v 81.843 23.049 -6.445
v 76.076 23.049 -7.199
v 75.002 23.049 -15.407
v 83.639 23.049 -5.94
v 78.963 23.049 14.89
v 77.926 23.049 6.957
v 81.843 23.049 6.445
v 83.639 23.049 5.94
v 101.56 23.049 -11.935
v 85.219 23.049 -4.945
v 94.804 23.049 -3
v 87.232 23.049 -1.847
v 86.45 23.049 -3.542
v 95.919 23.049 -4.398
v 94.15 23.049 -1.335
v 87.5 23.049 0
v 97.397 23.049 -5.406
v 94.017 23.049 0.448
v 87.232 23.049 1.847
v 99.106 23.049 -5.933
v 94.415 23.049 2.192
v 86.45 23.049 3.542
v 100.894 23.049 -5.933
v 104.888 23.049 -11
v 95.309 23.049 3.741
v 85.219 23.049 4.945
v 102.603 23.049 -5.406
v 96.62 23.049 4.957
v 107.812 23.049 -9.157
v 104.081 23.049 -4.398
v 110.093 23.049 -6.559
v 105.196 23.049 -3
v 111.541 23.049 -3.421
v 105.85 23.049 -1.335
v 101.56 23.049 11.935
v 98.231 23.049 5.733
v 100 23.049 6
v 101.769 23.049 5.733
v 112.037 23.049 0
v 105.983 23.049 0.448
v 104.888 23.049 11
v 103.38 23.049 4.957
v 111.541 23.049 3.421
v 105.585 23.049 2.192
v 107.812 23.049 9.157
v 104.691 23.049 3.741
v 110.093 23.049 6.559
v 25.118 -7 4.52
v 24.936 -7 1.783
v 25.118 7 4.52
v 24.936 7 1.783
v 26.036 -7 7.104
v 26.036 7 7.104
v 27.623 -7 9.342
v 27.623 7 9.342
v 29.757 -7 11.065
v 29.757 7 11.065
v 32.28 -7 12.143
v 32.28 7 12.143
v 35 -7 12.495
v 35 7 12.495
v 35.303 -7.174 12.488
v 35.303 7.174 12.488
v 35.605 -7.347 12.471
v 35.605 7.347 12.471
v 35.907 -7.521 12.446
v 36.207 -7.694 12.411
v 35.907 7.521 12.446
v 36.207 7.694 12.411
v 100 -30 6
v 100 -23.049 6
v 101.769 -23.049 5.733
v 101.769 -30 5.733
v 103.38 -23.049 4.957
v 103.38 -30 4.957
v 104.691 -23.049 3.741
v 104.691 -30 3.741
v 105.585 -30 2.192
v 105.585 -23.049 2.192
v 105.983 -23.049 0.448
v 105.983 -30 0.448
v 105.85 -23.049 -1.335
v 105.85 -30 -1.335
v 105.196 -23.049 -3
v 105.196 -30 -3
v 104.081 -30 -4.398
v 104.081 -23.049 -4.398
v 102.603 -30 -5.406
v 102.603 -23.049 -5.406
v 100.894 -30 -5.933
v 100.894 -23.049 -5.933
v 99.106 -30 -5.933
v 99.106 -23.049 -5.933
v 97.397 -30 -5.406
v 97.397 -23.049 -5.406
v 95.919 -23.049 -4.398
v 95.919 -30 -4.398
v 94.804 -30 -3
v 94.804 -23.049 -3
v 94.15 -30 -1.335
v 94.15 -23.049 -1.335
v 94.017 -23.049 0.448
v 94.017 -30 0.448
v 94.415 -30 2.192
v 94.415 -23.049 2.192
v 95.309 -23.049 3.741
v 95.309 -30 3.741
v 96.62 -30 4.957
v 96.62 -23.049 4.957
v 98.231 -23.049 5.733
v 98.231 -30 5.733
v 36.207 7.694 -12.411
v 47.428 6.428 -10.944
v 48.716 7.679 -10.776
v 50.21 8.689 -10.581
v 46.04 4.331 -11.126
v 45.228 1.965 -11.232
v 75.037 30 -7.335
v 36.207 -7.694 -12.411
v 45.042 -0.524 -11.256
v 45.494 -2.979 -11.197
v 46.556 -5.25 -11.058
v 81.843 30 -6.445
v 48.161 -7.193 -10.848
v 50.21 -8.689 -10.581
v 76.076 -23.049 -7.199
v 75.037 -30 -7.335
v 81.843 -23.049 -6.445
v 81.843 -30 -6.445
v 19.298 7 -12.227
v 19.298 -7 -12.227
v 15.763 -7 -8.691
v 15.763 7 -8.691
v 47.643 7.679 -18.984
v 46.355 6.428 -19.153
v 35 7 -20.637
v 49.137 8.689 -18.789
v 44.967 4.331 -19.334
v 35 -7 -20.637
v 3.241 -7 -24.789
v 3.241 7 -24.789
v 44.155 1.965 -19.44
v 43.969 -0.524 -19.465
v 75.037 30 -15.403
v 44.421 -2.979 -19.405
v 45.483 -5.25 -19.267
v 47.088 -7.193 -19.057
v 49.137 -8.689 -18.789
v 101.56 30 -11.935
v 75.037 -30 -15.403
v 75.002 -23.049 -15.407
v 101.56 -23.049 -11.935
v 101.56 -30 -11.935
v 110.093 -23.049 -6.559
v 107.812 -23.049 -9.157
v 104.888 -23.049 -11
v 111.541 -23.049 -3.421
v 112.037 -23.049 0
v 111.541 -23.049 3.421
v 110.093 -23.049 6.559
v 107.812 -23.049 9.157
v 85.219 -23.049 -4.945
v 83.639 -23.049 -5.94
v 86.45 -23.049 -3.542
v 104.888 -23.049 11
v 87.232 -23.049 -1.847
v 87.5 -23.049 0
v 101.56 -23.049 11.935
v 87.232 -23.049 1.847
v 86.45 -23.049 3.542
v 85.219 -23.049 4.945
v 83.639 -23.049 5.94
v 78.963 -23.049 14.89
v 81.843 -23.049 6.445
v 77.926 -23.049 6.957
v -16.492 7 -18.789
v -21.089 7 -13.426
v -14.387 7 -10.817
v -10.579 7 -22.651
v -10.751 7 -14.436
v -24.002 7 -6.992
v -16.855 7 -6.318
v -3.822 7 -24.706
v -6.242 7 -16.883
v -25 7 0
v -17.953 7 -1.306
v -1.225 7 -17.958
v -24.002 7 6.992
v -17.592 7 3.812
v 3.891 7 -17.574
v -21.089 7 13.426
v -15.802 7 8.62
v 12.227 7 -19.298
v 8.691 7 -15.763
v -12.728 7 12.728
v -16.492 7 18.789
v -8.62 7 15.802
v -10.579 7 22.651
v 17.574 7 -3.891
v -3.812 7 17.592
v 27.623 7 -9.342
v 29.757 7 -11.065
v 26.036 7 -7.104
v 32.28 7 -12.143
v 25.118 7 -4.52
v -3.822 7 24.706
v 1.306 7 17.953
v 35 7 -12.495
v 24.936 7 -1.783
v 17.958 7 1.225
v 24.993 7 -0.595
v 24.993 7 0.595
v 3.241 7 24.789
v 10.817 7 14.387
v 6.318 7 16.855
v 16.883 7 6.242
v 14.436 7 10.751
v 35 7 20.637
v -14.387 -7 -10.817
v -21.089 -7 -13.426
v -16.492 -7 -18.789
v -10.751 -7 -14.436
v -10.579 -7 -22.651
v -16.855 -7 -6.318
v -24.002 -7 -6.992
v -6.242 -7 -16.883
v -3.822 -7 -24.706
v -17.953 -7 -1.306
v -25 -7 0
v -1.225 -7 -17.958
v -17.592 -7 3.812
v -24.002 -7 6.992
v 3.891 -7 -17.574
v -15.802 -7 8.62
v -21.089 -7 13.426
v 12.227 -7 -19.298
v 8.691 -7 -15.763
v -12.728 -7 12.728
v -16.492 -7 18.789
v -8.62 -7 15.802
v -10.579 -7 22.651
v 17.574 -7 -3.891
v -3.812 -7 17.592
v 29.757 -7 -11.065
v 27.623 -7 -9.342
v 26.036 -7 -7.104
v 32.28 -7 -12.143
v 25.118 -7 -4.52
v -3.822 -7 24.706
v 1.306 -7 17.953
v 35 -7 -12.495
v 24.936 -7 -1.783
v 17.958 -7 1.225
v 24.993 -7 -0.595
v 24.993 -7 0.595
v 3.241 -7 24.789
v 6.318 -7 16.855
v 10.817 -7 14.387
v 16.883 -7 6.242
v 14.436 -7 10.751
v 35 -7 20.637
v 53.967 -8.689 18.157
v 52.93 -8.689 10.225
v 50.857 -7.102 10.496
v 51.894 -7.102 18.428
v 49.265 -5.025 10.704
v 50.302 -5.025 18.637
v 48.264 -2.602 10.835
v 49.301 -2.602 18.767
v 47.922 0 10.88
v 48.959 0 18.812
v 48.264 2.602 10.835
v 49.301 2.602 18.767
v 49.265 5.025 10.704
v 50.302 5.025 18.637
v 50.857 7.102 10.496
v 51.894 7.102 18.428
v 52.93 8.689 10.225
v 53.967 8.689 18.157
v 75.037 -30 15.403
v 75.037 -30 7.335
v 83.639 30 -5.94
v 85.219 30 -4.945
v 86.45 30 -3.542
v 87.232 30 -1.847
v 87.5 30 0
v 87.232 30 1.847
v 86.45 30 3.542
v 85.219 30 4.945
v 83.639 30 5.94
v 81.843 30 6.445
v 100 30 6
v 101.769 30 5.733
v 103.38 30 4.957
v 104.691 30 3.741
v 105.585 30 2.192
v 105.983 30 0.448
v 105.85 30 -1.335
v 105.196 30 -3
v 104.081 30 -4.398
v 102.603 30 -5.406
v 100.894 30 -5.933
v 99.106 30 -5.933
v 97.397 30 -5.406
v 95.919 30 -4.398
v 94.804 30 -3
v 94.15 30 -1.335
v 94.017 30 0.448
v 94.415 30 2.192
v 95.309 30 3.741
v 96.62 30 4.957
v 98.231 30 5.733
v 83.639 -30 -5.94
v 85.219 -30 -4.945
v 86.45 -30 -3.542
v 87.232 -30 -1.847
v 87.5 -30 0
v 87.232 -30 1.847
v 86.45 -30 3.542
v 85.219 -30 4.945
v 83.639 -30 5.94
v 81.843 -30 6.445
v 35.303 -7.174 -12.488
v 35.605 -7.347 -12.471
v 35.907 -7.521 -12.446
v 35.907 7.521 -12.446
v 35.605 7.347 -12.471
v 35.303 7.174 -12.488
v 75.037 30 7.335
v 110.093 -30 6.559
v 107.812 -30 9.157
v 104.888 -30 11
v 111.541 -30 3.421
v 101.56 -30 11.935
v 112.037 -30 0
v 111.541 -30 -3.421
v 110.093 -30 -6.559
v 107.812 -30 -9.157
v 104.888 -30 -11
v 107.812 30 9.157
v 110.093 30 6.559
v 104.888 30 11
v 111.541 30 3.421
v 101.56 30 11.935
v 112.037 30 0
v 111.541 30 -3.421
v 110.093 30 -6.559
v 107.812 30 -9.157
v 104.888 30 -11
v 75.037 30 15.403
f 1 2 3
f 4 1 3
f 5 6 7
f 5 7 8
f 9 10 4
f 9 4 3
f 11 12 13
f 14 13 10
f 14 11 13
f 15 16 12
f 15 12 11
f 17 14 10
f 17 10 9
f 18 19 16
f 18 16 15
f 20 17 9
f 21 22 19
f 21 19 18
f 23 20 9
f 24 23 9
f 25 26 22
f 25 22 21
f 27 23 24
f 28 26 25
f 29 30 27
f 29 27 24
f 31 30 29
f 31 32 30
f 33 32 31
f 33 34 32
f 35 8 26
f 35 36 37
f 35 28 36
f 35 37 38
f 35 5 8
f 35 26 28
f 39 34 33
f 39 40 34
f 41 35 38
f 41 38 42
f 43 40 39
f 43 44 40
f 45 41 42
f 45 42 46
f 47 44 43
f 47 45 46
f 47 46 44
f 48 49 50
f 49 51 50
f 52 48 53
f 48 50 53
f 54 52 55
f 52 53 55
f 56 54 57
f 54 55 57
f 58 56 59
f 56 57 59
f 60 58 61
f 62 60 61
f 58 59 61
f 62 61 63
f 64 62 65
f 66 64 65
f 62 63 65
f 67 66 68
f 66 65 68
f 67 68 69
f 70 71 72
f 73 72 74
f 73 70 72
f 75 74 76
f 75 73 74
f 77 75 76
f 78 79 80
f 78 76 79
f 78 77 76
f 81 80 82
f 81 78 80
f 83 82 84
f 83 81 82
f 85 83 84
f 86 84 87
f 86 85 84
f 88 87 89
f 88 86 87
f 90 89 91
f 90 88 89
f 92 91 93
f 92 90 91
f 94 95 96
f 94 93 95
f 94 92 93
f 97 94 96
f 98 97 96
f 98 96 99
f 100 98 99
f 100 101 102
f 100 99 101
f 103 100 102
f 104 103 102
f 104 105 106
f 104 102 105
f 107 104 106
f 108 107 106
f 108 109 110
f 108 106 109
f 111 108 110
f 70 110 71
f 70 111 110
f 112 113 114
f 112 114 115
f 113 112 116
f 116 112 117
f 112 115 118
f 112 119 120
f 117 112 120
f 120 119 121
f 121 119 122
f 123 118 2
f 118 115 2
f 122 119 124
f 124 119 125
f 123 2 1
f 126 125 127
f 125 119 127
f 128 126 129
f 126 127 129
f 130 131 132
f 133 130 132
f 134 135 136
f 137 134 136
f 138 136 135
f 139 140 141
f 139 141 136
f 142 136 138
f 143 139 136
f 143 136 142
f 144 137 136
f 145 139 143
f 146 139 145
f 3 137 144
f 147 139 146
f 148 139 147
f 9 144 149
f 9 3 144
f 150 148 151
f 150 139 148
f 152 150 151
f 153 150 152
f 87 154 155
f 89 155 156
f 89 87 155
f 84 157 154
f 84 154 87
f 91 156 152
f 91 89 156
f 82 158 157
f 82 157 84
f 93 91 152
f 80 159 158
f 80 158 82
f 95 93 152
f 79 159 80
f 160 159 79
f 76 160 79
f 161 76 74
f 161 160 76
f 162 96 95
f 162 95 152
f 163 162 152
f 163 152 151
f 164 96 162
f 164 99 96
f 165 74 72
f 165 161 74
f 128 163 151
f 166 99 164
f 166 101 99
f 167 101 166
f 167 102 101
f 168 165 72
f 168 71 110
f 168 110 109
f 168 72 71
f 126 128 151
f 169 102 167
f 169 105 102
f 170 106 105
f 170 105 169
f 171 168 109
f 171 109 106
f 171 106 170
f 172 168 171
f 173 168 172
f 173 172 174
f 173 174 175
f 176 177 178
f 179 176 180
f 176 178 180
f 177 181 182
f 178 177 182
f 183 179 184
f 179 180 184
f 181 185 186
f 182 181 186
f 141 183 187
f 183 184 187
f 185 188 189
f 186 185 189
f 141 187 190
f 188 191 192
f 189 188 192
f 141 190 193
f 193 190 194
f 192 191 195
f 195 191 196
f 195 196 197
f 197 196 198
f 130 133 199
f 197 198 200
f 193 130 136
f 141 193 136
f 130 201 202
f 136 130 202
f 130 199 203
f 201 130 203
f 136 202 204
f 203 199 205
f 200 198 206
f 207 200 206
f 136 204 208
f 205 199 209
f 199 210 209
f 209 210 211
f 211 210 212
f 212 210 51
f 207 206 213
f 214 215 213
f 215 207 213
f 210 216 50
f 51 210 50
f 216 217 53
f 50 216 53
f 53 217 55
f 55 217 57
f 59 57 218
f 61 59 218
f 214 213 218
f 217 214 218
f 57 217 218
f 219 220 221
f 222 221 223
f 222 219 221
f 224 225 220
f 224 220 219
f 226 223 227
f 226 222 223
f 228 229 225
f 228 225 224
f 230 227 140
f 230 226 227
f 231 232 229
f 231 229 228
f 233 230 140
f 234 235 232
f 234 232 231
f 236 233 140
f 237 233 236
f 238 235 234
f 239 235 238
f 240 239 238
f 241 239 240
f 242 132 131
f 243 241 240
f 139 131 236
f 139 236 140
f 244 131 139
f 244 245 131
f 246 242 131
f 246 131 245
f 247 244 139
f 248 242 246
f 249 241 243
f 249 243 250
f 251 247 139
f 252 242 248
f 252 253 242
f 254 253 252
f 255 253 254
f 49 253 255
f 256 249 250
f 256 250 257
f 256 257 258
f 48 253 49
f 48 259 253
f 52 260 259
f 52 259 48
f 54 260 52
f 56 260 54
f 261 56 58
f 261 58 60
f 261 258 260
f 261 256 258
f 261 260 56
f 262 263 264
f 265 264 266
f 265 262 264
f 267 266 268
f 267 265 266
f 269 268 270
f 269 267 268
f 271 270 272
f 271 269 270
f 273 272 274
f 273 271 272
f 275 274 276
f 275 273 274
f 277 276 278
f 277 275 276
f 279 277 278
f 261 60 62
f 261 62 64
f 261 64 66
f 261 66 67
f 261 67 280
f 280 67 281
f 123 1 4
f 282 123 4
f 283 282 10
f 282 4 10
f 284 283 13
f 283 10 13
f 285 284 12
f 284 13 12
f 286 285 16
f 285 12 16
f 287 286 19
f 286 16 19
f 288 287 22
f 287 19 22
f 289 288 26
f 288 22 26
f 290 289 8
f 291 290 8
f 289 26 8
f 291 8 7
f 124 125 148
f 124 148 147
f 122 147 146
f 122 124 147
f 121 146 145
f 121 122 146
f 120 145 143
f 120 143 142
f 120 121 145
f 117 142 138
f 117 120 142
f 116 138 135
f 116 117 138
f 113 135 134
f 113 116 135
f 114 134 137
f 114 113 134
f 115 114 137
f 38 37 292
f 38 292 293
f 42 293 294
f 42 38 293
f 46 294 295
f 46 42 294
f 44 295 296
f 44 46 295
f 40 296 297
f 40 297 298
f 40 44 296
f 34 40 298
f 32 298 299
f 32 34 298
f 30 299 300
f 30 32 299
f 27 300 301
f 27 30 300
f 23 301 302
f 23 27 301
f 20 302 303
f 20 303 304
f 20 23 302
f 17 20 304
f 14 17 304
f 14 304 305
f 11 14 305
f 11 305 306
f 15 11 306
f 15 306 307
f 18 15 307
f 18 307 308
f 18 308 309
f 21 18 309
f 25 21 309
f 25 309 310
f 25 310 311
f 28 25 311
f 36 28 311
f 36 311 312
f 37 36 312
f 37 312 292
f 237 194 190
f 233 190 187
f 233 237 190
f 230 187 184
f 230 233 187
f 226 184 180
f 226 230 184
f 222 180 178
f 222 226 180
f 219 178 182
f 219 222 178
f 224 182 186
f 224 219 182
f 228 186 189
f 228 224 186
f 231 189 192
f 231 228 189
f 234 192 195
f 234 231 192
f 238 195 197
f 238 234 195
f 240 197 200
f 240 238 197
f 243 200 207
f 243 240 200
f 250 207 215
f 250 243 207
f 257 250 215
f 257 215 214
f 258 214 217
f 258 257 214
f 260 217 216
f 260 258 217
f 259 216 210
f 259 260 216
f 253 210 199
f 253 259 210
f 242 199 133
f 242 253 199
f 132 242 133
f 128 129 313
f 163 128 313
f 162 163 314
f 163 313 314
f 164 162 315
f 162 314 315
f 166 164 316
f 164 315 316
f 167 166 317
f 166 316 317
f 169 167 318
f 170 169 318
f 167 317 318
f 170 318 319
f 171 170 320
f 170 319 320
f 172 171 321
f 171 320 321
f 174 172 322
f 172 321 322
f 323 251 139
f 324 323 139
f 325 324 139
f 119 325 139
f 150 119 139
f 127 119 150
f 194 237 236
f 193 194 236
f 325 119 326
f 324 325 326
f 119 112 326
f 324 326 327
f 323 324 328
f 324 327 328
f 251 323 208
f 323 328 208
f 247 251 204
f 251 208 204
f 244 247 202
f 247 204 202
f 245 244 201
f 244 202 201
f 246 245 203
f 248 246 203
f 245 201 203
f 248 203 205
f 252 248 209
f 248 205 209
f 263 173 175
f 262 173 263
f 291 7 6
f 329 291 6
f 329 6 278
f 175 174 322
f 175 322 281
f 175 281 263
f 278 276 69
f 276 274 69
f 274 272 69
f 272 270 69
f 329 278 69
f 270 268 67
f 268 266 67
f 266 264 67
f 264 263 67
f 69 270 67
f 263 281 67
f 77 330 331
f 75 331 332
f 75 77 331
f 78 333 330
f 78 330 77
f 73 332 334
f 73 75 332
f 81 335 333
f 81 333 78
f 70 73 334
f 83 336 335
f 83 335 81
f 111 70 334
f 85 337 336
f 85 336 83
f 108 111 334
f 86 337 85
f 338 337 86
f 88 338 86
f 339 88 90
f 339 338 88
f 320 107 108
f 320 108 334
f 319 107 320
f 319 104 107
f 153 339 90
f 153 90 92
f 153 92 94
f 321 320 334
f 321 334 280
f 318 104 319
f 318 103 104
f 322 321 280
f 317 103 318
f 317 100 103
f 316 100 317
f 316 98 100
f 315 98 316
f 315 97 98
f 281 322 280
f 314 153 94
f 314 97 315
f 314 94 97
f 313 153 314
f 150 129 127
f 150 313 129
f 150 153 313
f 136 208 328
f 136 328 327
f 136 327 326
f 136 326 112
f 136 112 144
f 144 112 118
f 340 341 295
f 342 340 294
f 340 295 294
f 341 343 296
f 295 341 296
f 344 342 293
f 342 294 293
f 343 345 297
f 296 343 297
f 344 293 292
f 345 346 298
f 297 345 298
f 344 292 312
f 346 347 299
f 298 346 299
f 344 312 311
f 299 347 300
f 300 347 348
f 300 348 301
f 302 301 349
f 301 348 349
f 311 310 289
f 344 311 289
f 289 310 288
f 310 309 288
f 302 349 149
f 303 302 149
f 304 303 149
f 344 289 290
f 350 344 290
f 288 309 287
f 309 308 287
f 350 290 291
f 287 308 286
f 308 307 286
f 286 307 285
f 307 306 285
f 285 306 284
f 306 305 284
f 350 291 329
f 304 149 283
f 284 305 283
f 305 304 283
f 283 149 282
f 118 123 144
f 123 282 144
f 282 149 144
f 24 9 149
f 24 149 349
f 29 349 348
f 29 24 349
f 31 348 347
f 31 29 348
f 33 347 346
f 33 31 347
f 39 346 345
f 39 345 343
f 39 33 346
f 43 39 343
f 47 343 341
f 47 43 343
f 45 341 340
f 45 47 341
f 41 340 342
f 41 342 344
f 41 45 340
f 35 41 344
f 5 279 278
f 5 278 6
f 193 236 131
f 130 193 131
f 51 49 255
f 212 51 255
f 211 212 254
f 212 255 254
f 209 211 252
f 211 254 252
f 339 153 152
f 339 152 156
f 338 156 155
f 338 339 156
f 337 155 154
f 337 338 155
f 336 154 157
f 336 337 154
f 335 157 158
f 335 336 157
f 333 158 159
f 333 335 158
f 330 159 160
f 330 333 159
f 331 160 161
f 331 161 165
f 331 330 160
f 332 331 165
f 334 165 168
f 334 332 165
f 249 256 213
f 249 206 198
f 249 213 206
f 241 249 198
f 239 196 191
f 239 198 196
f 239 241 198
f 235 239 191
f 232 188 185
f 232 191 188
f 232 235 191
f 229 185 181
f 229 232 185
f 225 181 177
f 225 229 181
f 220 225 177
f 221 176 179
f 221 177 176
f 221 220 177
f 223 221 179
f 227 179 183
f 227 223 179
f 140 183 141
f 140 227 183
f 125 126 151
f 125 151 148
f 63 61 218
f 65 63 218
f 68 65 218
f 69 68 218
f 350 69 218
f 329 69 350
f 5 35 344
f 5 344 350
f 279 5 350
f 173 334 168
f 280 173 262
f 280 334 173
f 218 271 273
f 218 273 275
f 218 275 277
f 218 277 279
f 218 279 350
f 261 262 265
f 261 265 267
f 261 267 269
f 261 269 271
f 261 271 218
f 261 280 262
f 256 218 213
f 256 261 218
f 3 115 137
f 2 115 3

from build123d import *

# Parameters (mm, degrees)
BOSS_EXTRUDE2_DEPTH            = 30
BOSS_EXTRUDE2_DEPTH_BACK       = 30
SKETCH1_R                      = 6
SKETCH1_R_2                    = 18
CUT_EXTRUDE1_DEPTH             = 30
CUT_EXTRUDE1_DIRECTION_2_REACH = 120.648
CUT_EXTRUDE3_DEPTH             = 124.351468544
FILLET1_R                      = 10
CUT_EXTRUDE4_DEPTH             = 121.608033182


with BuildPart() as part:
    # Sketch1 → Boss-Extrude2 (new, two sides: drawn at the far end of the back side and taken through both)
    with BuildSketch(Plane(origin=(0, 0, 0), x_dir=(1, 0, 0), z_dir=(0, 1, 0)).offset(-BOSS_EXTRUDE2_DEPTH_BACK)):
        with BuildLine():
            Line((3.240740741, 24.789062093), (101.560356653, 11.935474341))
            ThreePointArc((101.560356653, 11.935474341), (112.037037037, 0), (101.560356653, -11.935474341))
            Line((101.560356653, -11.935474341), (3.240740741, -24.789062093))
            ThreePointArc((3.240740741, -24.789062093), (-25, 0), (3.240740741, 24.789062093))
        make_face()
        with Locations((100, 0)):
            Circle(SKETCH1_R, mode=Mode.SUBTRACT)
        Circle(SKETCH1_R_2, mode=Mode.SUBTRACT)
        with BuildLine():
            Line((20.379344255, 14.480411863), (81.842592593, 6.445156144))
            ThreePointArc((81.842592593, 6.445156144), (87.5, 0), (81.842592593, -6.445156144))
            Line((81.842592593, -6.445156144), (20.379344255, -14.480411863))
            ThreePointArc((20.379344255, -14.480411863), (25, 0), (20.379344255, 14.480411863))
        make_face(mode=Mode.SUBTRACT)
    extrude(amount=BOSS_EXTRUDE2_DEPTH + BOSS_EXTRUDE2_DEPTH_BACK)

    # Sketch3 → Cut-Extrude1 (cut)
    with BuildSketch(Plane.XY):
        Polygon((-25, 7), (35, 7), (75.037037037, 30), (-25, 30), align=None)
    cut_extrude1 = extrude(amount=-CUT_EXTRUDE1_DEPTH, mode=Mode.SUBTRACT)

    # Sketch3 → Cut-Extrude1 direction 2 (cut, up to next)
    with BuildSketch(Plane.XY, mode=Mode.PRIVATE) as cut_extrude1_direction_2_sk1:
        Polygon((-25, 7), (35, 7), (75.037037037, 30), (-25, 30), align=None)
    cut_extrude1_direction_2_tool1 = extrude(cut_extrude1_direction_2_sk1.sketch, amount=CUT_EXTRUDE1_DIRECTION_2_REACH, mode=Mode.PRIVATE) & part.part
    cut_extrude1_direction_2 = cut_extrude1_direction_2_tool1.solids().sort_by_distance((15.843943, 19.458999, 0))[0]
    add(cut_extrude1_direction_2, mode=Mode.SUBTRACT)

    # Mirror1: Cut-Extrude1, Cut-Extrude1 direction 2 across plane
    add(cut_extrude1.mirror(Plane.ZX), mode=Mode.SUBTRACT)
    add(cut_extrude1_direction_2.mirror(Plane.ZX), mode=Mode.SUBTRACT)

    # Sketch4 → Cut-Extrude3 (cut, through all)
    with BuildSketch(Plane(origin=(3.240740741, 0, 24.789062093), x_dir=(0.9915624837205597, 0, -0.12962962962962948), z_dir=(0.12962962962962948, 0, 0.9915624837205597))):
        with BuildLine():
            Line((51.158073352, 8.689189147), (76.366869206, 23.048648682))
            Line((76.366869206, 23.048648682), (111.193285409, 23.048648682))
            Line((111.193285409, 23.048648682), (111.193285409, -23.048648682))
            Line((111.193285409, -23.048648682), (76.366869206, -23.048648682))
            Line((76.366869206, -23.048648682), (51.158073352, -8.689189147))
            ThreePointArc((51.158073352, -8.689189147), (46.107617974, 0), (51.158073352, 8.689189147))
        make_face()
    extrude(amount=-CUT_EXTRUDE3_DEPTH, mode=Mode.SUBTRACT)

    # Fillet1
    fillet1_edges = [part.edges().sort_by_distance(p)[0] for p in [
        (20.379344255, 0, -14.480411863),
        (20.379344255, 0, 14.480411863),
    ]]
    fillet(fillet1_edges, radius=FILLET1_R)

    # Sketch5 → Cut-Extrude4 (cut, through all)
    with BuildSketch(Plane(origin=(0, 7, 0), x_dir=(1, 0, 0), z_dir=(0, 1, 0))):
        with BuildLine():
            Line((8.691485355, 15.762553167), (12.227019261, 19.298087073))
            Line((12.227019261, 19.298087073), (19.298087073, 12.227019261))
            Line((19.298087073, 12.227019261), (15.762553167, 8.691485355))
            ThreePointArc((15.762553167, 8.691485355), (-12.727922061, -12.727922061), (8.691485355, 15.762553167))
        make_face()
    extrude(amount=-CUT_EXTRUDE4_DEPTH, mode=Mode.SUBTRACT)


solid = part.part
